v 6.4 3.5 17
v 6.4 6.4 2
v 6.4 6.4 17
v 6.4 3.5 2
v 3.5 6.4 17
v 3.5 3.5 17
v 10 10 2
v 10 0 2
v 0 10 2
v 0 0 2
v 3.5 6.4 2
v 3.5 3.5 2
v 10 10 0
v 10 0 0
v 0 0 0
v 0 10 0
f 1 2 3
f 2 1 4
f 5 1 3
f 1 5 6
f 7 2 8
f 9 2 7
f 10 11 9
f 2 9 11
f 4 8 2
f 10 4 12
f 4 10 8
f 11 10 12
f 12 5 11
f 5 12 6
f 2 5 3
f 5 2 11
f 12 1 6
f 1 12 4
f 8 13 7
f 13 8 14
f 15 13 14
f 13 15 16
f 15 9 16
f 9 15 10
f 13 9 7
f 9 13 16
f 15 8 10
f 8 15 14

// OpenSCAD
translate([3.5,3.5,2]) cube([2.9,2.9,15]);
cube([10,10,2]);
